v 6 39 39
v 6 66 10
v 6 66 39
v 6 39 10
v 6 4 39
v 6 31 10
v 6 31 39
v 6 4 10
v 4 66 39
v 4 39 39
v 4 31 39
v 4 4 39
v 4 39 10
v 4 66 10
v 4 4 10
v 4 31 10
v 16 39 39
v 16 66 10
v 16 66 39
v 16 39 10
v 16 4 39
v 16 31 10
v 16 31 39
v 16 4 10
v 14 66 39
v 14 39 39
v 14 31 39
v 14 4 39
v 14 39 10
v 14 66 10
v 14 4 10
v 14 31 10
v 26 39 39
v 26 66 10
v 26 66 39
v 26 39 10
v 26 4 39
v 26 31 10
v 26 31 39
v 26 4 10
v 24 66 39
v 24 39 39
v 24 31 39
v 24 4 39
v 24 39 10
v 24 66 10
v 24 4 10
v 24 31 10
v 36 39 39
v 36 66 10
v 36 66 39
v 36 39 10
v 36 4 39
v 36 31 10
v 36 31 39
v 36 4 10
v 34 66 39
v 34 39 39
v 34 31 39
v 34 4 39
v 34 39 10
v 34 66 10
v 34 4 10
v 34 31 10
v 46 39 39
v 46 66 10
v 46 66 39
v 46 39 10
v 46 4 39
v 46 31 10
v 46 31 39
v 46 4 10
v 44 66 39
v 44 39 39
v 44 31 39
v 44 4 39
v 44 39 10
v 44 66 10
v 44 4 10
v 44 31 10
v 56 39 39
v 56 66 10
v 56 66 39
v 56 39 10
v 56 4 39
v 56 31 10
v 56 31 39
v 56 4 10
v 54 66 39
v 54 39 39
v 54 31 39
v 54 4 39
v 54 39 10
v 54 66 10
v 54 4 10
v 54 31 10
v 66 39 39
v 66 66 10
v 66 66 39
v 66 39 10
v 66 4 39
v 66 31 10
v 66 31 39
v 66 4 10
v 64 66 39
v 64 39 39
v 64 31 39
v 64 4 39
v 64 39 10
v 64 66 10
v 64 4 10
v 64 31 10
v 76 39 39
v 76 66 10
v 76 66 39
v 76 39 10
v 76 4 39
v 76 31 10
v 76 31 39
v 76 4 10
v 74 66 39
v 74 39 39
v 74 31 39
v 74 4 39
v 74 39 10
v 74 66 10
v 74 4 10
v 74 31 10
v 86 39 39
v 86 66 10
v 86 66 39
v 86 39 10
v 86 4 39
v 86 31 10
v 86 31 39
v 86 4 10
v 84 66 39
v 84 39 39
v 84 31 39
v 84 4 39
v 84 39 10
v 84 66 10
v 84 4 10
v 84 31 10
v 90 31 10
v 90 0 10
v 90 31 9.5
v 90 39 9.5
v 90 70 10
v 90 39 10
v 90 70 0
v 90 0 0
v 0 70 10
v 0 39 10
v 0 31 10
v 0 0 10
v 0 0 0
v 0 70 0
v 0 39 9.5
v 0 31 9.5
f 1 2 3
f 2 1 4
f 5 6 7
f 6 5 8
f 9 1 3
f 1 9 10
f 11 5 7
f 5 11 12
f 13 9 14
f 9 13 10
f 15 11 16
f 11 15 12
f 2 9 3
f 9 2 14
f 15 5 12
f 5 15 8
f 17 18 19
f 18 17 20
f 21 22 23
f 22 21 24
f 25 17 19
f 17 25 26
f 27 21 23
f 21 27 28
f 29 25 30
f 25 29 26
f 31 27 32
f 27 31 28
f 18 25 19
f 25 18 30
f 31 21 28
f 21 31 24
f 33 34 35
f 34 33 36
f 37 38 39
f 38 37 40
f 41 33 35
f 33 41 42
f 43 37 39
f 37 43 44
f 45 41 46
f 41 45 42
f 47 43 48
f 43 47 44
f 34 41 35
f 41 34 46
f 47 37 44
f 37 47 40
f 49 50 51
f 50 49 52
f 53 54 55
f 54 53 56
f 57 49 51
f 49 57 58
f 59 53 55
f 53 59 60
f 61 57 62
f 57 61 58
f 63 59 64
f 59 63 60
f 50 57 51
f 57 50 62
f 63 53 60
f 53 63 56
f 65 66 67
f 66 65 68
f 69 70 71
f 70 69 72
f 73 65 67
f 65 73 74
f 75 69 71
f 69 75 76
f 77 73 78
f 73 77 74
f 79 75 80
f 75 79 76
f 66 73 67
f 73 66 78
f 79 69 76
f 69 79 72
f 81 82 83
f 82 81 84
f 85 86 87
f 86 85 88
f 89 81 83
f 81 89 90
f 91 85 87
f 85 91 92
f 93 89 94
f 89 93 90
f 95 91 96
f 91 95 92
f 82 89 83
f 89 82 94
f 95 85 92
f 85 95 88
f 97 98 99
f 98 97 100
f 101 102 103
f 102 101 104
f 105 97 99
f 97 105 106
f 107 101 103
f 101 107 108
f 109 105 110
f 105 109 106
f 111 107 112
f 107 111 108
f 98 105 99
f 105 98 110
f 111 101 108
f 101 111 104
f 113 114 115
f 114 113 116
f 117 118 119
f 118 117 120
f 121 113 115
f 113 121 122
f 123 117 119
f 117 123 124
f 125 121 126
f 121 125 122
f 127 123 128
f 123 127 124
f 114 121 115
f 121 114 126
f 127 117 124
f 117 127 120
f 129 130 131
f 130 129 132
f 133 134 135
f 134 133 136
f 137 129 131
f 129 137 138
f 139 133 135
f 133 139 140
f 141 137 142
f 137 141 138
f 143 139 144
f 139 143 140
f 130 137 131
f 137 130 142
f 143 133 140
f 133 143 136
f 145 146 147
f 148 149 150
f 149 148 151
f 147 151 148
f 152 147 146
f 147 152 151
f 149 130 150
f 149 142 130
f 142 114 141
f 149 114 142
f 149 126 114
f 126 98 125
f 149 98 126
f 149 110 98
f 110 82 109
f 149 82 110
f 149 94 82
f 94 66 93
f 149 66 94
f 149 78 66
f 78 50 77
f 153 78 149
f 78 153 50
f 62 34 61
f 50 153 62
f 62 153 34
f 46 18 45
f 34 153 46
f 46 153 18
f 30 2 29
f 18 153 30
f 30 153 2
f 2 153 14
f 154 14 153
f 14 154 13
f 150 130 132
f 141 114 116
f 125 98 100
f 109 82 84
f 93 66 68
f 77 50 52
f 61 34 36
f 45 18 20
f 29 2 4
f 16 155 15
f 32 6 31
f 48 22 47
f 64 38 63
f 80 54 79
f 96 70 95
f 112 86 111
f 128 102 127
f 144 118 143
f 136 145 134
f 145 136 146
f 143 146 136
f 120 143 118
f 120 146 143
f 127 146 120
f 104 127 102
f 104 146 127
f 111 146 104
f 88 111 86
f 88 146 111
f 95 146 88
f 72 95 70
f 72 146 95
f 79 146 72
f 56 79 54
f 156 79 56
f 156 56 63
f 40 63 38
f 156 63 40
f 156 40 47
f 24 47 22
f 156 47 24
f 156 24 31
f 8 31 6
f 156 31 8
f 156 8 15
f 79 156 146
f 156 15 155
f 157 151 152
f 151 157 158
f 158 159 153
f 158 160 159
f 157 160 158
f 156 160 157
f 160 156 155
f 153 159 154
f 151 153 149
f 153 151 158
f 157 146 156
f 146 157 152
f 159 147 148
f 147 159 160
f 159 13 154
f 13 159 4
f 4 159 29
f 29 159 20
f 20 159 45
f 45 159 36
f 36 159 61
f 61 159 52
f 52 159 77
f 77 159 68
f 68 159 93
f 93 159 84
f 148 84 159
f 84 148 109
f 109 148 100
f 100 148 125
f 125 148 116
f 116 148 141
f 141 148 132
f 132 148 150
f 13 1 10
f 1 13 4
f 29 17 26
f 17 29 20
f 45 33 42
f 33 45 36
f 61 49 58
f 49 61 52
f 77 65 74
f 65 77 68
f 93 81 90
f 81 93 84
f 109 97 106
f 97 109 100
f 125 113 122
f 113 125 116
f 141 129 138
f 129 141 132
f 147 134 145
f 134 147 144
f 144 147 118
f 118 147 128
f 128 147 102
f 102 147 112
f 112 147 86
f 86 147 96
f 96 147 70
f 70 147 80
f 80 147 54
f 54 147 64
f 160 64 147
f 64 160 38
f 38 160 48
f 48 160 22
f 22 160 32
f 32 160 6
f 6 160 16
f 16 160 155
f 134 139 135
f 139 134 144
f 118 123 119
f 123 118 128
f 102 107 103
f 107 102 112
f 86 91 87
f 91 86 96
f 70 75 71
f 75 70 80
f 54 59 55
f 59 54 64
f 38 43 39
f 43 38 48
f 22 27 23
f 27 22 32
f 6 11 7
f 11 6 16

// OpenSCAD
$fn = 32;

// ----------------------------------------------------------------------
// Heatsink: slotted fin block
// ----------------------------------------------------------------------

// --- parameters (mm) ---
base_l = 90;              // base length, X
base_w = 70;              // base width, Y
base_t = 10;              // base plate thickness
fin_h = 30;               // fin height above the base
fin_t = 2;                // fin thickness
edge = 4;                 // margin from the base ends
pitch = 10;               // fin pitch
slot_w = 8;               // central slot width, Y
fit_tol = 0.1;            // tolerance for press fits, mm
free_tol = 0.3;           // tolerance for clearance fits, mm

n_fins = floor((base_l - 2 * edge - fin_t) / pitch) + 1;  // fin count
total_h = base_t + fin_h - 1;  // overall height

difference() {
union() {
  cube([base_l, base_w, base_t]);
  for (i = [0 : n_fins - 1])
    translate([edge + i * pitch, edge, base_t - 1])
      cube([fin_t, base_w - 2 * edge, fin_h]);
}
  translate([-1, base_w / 2 - slot_w / 2, base_t - 0.5])
    cube([base_l + 2, slot_w, fin_h + 2]);
}
